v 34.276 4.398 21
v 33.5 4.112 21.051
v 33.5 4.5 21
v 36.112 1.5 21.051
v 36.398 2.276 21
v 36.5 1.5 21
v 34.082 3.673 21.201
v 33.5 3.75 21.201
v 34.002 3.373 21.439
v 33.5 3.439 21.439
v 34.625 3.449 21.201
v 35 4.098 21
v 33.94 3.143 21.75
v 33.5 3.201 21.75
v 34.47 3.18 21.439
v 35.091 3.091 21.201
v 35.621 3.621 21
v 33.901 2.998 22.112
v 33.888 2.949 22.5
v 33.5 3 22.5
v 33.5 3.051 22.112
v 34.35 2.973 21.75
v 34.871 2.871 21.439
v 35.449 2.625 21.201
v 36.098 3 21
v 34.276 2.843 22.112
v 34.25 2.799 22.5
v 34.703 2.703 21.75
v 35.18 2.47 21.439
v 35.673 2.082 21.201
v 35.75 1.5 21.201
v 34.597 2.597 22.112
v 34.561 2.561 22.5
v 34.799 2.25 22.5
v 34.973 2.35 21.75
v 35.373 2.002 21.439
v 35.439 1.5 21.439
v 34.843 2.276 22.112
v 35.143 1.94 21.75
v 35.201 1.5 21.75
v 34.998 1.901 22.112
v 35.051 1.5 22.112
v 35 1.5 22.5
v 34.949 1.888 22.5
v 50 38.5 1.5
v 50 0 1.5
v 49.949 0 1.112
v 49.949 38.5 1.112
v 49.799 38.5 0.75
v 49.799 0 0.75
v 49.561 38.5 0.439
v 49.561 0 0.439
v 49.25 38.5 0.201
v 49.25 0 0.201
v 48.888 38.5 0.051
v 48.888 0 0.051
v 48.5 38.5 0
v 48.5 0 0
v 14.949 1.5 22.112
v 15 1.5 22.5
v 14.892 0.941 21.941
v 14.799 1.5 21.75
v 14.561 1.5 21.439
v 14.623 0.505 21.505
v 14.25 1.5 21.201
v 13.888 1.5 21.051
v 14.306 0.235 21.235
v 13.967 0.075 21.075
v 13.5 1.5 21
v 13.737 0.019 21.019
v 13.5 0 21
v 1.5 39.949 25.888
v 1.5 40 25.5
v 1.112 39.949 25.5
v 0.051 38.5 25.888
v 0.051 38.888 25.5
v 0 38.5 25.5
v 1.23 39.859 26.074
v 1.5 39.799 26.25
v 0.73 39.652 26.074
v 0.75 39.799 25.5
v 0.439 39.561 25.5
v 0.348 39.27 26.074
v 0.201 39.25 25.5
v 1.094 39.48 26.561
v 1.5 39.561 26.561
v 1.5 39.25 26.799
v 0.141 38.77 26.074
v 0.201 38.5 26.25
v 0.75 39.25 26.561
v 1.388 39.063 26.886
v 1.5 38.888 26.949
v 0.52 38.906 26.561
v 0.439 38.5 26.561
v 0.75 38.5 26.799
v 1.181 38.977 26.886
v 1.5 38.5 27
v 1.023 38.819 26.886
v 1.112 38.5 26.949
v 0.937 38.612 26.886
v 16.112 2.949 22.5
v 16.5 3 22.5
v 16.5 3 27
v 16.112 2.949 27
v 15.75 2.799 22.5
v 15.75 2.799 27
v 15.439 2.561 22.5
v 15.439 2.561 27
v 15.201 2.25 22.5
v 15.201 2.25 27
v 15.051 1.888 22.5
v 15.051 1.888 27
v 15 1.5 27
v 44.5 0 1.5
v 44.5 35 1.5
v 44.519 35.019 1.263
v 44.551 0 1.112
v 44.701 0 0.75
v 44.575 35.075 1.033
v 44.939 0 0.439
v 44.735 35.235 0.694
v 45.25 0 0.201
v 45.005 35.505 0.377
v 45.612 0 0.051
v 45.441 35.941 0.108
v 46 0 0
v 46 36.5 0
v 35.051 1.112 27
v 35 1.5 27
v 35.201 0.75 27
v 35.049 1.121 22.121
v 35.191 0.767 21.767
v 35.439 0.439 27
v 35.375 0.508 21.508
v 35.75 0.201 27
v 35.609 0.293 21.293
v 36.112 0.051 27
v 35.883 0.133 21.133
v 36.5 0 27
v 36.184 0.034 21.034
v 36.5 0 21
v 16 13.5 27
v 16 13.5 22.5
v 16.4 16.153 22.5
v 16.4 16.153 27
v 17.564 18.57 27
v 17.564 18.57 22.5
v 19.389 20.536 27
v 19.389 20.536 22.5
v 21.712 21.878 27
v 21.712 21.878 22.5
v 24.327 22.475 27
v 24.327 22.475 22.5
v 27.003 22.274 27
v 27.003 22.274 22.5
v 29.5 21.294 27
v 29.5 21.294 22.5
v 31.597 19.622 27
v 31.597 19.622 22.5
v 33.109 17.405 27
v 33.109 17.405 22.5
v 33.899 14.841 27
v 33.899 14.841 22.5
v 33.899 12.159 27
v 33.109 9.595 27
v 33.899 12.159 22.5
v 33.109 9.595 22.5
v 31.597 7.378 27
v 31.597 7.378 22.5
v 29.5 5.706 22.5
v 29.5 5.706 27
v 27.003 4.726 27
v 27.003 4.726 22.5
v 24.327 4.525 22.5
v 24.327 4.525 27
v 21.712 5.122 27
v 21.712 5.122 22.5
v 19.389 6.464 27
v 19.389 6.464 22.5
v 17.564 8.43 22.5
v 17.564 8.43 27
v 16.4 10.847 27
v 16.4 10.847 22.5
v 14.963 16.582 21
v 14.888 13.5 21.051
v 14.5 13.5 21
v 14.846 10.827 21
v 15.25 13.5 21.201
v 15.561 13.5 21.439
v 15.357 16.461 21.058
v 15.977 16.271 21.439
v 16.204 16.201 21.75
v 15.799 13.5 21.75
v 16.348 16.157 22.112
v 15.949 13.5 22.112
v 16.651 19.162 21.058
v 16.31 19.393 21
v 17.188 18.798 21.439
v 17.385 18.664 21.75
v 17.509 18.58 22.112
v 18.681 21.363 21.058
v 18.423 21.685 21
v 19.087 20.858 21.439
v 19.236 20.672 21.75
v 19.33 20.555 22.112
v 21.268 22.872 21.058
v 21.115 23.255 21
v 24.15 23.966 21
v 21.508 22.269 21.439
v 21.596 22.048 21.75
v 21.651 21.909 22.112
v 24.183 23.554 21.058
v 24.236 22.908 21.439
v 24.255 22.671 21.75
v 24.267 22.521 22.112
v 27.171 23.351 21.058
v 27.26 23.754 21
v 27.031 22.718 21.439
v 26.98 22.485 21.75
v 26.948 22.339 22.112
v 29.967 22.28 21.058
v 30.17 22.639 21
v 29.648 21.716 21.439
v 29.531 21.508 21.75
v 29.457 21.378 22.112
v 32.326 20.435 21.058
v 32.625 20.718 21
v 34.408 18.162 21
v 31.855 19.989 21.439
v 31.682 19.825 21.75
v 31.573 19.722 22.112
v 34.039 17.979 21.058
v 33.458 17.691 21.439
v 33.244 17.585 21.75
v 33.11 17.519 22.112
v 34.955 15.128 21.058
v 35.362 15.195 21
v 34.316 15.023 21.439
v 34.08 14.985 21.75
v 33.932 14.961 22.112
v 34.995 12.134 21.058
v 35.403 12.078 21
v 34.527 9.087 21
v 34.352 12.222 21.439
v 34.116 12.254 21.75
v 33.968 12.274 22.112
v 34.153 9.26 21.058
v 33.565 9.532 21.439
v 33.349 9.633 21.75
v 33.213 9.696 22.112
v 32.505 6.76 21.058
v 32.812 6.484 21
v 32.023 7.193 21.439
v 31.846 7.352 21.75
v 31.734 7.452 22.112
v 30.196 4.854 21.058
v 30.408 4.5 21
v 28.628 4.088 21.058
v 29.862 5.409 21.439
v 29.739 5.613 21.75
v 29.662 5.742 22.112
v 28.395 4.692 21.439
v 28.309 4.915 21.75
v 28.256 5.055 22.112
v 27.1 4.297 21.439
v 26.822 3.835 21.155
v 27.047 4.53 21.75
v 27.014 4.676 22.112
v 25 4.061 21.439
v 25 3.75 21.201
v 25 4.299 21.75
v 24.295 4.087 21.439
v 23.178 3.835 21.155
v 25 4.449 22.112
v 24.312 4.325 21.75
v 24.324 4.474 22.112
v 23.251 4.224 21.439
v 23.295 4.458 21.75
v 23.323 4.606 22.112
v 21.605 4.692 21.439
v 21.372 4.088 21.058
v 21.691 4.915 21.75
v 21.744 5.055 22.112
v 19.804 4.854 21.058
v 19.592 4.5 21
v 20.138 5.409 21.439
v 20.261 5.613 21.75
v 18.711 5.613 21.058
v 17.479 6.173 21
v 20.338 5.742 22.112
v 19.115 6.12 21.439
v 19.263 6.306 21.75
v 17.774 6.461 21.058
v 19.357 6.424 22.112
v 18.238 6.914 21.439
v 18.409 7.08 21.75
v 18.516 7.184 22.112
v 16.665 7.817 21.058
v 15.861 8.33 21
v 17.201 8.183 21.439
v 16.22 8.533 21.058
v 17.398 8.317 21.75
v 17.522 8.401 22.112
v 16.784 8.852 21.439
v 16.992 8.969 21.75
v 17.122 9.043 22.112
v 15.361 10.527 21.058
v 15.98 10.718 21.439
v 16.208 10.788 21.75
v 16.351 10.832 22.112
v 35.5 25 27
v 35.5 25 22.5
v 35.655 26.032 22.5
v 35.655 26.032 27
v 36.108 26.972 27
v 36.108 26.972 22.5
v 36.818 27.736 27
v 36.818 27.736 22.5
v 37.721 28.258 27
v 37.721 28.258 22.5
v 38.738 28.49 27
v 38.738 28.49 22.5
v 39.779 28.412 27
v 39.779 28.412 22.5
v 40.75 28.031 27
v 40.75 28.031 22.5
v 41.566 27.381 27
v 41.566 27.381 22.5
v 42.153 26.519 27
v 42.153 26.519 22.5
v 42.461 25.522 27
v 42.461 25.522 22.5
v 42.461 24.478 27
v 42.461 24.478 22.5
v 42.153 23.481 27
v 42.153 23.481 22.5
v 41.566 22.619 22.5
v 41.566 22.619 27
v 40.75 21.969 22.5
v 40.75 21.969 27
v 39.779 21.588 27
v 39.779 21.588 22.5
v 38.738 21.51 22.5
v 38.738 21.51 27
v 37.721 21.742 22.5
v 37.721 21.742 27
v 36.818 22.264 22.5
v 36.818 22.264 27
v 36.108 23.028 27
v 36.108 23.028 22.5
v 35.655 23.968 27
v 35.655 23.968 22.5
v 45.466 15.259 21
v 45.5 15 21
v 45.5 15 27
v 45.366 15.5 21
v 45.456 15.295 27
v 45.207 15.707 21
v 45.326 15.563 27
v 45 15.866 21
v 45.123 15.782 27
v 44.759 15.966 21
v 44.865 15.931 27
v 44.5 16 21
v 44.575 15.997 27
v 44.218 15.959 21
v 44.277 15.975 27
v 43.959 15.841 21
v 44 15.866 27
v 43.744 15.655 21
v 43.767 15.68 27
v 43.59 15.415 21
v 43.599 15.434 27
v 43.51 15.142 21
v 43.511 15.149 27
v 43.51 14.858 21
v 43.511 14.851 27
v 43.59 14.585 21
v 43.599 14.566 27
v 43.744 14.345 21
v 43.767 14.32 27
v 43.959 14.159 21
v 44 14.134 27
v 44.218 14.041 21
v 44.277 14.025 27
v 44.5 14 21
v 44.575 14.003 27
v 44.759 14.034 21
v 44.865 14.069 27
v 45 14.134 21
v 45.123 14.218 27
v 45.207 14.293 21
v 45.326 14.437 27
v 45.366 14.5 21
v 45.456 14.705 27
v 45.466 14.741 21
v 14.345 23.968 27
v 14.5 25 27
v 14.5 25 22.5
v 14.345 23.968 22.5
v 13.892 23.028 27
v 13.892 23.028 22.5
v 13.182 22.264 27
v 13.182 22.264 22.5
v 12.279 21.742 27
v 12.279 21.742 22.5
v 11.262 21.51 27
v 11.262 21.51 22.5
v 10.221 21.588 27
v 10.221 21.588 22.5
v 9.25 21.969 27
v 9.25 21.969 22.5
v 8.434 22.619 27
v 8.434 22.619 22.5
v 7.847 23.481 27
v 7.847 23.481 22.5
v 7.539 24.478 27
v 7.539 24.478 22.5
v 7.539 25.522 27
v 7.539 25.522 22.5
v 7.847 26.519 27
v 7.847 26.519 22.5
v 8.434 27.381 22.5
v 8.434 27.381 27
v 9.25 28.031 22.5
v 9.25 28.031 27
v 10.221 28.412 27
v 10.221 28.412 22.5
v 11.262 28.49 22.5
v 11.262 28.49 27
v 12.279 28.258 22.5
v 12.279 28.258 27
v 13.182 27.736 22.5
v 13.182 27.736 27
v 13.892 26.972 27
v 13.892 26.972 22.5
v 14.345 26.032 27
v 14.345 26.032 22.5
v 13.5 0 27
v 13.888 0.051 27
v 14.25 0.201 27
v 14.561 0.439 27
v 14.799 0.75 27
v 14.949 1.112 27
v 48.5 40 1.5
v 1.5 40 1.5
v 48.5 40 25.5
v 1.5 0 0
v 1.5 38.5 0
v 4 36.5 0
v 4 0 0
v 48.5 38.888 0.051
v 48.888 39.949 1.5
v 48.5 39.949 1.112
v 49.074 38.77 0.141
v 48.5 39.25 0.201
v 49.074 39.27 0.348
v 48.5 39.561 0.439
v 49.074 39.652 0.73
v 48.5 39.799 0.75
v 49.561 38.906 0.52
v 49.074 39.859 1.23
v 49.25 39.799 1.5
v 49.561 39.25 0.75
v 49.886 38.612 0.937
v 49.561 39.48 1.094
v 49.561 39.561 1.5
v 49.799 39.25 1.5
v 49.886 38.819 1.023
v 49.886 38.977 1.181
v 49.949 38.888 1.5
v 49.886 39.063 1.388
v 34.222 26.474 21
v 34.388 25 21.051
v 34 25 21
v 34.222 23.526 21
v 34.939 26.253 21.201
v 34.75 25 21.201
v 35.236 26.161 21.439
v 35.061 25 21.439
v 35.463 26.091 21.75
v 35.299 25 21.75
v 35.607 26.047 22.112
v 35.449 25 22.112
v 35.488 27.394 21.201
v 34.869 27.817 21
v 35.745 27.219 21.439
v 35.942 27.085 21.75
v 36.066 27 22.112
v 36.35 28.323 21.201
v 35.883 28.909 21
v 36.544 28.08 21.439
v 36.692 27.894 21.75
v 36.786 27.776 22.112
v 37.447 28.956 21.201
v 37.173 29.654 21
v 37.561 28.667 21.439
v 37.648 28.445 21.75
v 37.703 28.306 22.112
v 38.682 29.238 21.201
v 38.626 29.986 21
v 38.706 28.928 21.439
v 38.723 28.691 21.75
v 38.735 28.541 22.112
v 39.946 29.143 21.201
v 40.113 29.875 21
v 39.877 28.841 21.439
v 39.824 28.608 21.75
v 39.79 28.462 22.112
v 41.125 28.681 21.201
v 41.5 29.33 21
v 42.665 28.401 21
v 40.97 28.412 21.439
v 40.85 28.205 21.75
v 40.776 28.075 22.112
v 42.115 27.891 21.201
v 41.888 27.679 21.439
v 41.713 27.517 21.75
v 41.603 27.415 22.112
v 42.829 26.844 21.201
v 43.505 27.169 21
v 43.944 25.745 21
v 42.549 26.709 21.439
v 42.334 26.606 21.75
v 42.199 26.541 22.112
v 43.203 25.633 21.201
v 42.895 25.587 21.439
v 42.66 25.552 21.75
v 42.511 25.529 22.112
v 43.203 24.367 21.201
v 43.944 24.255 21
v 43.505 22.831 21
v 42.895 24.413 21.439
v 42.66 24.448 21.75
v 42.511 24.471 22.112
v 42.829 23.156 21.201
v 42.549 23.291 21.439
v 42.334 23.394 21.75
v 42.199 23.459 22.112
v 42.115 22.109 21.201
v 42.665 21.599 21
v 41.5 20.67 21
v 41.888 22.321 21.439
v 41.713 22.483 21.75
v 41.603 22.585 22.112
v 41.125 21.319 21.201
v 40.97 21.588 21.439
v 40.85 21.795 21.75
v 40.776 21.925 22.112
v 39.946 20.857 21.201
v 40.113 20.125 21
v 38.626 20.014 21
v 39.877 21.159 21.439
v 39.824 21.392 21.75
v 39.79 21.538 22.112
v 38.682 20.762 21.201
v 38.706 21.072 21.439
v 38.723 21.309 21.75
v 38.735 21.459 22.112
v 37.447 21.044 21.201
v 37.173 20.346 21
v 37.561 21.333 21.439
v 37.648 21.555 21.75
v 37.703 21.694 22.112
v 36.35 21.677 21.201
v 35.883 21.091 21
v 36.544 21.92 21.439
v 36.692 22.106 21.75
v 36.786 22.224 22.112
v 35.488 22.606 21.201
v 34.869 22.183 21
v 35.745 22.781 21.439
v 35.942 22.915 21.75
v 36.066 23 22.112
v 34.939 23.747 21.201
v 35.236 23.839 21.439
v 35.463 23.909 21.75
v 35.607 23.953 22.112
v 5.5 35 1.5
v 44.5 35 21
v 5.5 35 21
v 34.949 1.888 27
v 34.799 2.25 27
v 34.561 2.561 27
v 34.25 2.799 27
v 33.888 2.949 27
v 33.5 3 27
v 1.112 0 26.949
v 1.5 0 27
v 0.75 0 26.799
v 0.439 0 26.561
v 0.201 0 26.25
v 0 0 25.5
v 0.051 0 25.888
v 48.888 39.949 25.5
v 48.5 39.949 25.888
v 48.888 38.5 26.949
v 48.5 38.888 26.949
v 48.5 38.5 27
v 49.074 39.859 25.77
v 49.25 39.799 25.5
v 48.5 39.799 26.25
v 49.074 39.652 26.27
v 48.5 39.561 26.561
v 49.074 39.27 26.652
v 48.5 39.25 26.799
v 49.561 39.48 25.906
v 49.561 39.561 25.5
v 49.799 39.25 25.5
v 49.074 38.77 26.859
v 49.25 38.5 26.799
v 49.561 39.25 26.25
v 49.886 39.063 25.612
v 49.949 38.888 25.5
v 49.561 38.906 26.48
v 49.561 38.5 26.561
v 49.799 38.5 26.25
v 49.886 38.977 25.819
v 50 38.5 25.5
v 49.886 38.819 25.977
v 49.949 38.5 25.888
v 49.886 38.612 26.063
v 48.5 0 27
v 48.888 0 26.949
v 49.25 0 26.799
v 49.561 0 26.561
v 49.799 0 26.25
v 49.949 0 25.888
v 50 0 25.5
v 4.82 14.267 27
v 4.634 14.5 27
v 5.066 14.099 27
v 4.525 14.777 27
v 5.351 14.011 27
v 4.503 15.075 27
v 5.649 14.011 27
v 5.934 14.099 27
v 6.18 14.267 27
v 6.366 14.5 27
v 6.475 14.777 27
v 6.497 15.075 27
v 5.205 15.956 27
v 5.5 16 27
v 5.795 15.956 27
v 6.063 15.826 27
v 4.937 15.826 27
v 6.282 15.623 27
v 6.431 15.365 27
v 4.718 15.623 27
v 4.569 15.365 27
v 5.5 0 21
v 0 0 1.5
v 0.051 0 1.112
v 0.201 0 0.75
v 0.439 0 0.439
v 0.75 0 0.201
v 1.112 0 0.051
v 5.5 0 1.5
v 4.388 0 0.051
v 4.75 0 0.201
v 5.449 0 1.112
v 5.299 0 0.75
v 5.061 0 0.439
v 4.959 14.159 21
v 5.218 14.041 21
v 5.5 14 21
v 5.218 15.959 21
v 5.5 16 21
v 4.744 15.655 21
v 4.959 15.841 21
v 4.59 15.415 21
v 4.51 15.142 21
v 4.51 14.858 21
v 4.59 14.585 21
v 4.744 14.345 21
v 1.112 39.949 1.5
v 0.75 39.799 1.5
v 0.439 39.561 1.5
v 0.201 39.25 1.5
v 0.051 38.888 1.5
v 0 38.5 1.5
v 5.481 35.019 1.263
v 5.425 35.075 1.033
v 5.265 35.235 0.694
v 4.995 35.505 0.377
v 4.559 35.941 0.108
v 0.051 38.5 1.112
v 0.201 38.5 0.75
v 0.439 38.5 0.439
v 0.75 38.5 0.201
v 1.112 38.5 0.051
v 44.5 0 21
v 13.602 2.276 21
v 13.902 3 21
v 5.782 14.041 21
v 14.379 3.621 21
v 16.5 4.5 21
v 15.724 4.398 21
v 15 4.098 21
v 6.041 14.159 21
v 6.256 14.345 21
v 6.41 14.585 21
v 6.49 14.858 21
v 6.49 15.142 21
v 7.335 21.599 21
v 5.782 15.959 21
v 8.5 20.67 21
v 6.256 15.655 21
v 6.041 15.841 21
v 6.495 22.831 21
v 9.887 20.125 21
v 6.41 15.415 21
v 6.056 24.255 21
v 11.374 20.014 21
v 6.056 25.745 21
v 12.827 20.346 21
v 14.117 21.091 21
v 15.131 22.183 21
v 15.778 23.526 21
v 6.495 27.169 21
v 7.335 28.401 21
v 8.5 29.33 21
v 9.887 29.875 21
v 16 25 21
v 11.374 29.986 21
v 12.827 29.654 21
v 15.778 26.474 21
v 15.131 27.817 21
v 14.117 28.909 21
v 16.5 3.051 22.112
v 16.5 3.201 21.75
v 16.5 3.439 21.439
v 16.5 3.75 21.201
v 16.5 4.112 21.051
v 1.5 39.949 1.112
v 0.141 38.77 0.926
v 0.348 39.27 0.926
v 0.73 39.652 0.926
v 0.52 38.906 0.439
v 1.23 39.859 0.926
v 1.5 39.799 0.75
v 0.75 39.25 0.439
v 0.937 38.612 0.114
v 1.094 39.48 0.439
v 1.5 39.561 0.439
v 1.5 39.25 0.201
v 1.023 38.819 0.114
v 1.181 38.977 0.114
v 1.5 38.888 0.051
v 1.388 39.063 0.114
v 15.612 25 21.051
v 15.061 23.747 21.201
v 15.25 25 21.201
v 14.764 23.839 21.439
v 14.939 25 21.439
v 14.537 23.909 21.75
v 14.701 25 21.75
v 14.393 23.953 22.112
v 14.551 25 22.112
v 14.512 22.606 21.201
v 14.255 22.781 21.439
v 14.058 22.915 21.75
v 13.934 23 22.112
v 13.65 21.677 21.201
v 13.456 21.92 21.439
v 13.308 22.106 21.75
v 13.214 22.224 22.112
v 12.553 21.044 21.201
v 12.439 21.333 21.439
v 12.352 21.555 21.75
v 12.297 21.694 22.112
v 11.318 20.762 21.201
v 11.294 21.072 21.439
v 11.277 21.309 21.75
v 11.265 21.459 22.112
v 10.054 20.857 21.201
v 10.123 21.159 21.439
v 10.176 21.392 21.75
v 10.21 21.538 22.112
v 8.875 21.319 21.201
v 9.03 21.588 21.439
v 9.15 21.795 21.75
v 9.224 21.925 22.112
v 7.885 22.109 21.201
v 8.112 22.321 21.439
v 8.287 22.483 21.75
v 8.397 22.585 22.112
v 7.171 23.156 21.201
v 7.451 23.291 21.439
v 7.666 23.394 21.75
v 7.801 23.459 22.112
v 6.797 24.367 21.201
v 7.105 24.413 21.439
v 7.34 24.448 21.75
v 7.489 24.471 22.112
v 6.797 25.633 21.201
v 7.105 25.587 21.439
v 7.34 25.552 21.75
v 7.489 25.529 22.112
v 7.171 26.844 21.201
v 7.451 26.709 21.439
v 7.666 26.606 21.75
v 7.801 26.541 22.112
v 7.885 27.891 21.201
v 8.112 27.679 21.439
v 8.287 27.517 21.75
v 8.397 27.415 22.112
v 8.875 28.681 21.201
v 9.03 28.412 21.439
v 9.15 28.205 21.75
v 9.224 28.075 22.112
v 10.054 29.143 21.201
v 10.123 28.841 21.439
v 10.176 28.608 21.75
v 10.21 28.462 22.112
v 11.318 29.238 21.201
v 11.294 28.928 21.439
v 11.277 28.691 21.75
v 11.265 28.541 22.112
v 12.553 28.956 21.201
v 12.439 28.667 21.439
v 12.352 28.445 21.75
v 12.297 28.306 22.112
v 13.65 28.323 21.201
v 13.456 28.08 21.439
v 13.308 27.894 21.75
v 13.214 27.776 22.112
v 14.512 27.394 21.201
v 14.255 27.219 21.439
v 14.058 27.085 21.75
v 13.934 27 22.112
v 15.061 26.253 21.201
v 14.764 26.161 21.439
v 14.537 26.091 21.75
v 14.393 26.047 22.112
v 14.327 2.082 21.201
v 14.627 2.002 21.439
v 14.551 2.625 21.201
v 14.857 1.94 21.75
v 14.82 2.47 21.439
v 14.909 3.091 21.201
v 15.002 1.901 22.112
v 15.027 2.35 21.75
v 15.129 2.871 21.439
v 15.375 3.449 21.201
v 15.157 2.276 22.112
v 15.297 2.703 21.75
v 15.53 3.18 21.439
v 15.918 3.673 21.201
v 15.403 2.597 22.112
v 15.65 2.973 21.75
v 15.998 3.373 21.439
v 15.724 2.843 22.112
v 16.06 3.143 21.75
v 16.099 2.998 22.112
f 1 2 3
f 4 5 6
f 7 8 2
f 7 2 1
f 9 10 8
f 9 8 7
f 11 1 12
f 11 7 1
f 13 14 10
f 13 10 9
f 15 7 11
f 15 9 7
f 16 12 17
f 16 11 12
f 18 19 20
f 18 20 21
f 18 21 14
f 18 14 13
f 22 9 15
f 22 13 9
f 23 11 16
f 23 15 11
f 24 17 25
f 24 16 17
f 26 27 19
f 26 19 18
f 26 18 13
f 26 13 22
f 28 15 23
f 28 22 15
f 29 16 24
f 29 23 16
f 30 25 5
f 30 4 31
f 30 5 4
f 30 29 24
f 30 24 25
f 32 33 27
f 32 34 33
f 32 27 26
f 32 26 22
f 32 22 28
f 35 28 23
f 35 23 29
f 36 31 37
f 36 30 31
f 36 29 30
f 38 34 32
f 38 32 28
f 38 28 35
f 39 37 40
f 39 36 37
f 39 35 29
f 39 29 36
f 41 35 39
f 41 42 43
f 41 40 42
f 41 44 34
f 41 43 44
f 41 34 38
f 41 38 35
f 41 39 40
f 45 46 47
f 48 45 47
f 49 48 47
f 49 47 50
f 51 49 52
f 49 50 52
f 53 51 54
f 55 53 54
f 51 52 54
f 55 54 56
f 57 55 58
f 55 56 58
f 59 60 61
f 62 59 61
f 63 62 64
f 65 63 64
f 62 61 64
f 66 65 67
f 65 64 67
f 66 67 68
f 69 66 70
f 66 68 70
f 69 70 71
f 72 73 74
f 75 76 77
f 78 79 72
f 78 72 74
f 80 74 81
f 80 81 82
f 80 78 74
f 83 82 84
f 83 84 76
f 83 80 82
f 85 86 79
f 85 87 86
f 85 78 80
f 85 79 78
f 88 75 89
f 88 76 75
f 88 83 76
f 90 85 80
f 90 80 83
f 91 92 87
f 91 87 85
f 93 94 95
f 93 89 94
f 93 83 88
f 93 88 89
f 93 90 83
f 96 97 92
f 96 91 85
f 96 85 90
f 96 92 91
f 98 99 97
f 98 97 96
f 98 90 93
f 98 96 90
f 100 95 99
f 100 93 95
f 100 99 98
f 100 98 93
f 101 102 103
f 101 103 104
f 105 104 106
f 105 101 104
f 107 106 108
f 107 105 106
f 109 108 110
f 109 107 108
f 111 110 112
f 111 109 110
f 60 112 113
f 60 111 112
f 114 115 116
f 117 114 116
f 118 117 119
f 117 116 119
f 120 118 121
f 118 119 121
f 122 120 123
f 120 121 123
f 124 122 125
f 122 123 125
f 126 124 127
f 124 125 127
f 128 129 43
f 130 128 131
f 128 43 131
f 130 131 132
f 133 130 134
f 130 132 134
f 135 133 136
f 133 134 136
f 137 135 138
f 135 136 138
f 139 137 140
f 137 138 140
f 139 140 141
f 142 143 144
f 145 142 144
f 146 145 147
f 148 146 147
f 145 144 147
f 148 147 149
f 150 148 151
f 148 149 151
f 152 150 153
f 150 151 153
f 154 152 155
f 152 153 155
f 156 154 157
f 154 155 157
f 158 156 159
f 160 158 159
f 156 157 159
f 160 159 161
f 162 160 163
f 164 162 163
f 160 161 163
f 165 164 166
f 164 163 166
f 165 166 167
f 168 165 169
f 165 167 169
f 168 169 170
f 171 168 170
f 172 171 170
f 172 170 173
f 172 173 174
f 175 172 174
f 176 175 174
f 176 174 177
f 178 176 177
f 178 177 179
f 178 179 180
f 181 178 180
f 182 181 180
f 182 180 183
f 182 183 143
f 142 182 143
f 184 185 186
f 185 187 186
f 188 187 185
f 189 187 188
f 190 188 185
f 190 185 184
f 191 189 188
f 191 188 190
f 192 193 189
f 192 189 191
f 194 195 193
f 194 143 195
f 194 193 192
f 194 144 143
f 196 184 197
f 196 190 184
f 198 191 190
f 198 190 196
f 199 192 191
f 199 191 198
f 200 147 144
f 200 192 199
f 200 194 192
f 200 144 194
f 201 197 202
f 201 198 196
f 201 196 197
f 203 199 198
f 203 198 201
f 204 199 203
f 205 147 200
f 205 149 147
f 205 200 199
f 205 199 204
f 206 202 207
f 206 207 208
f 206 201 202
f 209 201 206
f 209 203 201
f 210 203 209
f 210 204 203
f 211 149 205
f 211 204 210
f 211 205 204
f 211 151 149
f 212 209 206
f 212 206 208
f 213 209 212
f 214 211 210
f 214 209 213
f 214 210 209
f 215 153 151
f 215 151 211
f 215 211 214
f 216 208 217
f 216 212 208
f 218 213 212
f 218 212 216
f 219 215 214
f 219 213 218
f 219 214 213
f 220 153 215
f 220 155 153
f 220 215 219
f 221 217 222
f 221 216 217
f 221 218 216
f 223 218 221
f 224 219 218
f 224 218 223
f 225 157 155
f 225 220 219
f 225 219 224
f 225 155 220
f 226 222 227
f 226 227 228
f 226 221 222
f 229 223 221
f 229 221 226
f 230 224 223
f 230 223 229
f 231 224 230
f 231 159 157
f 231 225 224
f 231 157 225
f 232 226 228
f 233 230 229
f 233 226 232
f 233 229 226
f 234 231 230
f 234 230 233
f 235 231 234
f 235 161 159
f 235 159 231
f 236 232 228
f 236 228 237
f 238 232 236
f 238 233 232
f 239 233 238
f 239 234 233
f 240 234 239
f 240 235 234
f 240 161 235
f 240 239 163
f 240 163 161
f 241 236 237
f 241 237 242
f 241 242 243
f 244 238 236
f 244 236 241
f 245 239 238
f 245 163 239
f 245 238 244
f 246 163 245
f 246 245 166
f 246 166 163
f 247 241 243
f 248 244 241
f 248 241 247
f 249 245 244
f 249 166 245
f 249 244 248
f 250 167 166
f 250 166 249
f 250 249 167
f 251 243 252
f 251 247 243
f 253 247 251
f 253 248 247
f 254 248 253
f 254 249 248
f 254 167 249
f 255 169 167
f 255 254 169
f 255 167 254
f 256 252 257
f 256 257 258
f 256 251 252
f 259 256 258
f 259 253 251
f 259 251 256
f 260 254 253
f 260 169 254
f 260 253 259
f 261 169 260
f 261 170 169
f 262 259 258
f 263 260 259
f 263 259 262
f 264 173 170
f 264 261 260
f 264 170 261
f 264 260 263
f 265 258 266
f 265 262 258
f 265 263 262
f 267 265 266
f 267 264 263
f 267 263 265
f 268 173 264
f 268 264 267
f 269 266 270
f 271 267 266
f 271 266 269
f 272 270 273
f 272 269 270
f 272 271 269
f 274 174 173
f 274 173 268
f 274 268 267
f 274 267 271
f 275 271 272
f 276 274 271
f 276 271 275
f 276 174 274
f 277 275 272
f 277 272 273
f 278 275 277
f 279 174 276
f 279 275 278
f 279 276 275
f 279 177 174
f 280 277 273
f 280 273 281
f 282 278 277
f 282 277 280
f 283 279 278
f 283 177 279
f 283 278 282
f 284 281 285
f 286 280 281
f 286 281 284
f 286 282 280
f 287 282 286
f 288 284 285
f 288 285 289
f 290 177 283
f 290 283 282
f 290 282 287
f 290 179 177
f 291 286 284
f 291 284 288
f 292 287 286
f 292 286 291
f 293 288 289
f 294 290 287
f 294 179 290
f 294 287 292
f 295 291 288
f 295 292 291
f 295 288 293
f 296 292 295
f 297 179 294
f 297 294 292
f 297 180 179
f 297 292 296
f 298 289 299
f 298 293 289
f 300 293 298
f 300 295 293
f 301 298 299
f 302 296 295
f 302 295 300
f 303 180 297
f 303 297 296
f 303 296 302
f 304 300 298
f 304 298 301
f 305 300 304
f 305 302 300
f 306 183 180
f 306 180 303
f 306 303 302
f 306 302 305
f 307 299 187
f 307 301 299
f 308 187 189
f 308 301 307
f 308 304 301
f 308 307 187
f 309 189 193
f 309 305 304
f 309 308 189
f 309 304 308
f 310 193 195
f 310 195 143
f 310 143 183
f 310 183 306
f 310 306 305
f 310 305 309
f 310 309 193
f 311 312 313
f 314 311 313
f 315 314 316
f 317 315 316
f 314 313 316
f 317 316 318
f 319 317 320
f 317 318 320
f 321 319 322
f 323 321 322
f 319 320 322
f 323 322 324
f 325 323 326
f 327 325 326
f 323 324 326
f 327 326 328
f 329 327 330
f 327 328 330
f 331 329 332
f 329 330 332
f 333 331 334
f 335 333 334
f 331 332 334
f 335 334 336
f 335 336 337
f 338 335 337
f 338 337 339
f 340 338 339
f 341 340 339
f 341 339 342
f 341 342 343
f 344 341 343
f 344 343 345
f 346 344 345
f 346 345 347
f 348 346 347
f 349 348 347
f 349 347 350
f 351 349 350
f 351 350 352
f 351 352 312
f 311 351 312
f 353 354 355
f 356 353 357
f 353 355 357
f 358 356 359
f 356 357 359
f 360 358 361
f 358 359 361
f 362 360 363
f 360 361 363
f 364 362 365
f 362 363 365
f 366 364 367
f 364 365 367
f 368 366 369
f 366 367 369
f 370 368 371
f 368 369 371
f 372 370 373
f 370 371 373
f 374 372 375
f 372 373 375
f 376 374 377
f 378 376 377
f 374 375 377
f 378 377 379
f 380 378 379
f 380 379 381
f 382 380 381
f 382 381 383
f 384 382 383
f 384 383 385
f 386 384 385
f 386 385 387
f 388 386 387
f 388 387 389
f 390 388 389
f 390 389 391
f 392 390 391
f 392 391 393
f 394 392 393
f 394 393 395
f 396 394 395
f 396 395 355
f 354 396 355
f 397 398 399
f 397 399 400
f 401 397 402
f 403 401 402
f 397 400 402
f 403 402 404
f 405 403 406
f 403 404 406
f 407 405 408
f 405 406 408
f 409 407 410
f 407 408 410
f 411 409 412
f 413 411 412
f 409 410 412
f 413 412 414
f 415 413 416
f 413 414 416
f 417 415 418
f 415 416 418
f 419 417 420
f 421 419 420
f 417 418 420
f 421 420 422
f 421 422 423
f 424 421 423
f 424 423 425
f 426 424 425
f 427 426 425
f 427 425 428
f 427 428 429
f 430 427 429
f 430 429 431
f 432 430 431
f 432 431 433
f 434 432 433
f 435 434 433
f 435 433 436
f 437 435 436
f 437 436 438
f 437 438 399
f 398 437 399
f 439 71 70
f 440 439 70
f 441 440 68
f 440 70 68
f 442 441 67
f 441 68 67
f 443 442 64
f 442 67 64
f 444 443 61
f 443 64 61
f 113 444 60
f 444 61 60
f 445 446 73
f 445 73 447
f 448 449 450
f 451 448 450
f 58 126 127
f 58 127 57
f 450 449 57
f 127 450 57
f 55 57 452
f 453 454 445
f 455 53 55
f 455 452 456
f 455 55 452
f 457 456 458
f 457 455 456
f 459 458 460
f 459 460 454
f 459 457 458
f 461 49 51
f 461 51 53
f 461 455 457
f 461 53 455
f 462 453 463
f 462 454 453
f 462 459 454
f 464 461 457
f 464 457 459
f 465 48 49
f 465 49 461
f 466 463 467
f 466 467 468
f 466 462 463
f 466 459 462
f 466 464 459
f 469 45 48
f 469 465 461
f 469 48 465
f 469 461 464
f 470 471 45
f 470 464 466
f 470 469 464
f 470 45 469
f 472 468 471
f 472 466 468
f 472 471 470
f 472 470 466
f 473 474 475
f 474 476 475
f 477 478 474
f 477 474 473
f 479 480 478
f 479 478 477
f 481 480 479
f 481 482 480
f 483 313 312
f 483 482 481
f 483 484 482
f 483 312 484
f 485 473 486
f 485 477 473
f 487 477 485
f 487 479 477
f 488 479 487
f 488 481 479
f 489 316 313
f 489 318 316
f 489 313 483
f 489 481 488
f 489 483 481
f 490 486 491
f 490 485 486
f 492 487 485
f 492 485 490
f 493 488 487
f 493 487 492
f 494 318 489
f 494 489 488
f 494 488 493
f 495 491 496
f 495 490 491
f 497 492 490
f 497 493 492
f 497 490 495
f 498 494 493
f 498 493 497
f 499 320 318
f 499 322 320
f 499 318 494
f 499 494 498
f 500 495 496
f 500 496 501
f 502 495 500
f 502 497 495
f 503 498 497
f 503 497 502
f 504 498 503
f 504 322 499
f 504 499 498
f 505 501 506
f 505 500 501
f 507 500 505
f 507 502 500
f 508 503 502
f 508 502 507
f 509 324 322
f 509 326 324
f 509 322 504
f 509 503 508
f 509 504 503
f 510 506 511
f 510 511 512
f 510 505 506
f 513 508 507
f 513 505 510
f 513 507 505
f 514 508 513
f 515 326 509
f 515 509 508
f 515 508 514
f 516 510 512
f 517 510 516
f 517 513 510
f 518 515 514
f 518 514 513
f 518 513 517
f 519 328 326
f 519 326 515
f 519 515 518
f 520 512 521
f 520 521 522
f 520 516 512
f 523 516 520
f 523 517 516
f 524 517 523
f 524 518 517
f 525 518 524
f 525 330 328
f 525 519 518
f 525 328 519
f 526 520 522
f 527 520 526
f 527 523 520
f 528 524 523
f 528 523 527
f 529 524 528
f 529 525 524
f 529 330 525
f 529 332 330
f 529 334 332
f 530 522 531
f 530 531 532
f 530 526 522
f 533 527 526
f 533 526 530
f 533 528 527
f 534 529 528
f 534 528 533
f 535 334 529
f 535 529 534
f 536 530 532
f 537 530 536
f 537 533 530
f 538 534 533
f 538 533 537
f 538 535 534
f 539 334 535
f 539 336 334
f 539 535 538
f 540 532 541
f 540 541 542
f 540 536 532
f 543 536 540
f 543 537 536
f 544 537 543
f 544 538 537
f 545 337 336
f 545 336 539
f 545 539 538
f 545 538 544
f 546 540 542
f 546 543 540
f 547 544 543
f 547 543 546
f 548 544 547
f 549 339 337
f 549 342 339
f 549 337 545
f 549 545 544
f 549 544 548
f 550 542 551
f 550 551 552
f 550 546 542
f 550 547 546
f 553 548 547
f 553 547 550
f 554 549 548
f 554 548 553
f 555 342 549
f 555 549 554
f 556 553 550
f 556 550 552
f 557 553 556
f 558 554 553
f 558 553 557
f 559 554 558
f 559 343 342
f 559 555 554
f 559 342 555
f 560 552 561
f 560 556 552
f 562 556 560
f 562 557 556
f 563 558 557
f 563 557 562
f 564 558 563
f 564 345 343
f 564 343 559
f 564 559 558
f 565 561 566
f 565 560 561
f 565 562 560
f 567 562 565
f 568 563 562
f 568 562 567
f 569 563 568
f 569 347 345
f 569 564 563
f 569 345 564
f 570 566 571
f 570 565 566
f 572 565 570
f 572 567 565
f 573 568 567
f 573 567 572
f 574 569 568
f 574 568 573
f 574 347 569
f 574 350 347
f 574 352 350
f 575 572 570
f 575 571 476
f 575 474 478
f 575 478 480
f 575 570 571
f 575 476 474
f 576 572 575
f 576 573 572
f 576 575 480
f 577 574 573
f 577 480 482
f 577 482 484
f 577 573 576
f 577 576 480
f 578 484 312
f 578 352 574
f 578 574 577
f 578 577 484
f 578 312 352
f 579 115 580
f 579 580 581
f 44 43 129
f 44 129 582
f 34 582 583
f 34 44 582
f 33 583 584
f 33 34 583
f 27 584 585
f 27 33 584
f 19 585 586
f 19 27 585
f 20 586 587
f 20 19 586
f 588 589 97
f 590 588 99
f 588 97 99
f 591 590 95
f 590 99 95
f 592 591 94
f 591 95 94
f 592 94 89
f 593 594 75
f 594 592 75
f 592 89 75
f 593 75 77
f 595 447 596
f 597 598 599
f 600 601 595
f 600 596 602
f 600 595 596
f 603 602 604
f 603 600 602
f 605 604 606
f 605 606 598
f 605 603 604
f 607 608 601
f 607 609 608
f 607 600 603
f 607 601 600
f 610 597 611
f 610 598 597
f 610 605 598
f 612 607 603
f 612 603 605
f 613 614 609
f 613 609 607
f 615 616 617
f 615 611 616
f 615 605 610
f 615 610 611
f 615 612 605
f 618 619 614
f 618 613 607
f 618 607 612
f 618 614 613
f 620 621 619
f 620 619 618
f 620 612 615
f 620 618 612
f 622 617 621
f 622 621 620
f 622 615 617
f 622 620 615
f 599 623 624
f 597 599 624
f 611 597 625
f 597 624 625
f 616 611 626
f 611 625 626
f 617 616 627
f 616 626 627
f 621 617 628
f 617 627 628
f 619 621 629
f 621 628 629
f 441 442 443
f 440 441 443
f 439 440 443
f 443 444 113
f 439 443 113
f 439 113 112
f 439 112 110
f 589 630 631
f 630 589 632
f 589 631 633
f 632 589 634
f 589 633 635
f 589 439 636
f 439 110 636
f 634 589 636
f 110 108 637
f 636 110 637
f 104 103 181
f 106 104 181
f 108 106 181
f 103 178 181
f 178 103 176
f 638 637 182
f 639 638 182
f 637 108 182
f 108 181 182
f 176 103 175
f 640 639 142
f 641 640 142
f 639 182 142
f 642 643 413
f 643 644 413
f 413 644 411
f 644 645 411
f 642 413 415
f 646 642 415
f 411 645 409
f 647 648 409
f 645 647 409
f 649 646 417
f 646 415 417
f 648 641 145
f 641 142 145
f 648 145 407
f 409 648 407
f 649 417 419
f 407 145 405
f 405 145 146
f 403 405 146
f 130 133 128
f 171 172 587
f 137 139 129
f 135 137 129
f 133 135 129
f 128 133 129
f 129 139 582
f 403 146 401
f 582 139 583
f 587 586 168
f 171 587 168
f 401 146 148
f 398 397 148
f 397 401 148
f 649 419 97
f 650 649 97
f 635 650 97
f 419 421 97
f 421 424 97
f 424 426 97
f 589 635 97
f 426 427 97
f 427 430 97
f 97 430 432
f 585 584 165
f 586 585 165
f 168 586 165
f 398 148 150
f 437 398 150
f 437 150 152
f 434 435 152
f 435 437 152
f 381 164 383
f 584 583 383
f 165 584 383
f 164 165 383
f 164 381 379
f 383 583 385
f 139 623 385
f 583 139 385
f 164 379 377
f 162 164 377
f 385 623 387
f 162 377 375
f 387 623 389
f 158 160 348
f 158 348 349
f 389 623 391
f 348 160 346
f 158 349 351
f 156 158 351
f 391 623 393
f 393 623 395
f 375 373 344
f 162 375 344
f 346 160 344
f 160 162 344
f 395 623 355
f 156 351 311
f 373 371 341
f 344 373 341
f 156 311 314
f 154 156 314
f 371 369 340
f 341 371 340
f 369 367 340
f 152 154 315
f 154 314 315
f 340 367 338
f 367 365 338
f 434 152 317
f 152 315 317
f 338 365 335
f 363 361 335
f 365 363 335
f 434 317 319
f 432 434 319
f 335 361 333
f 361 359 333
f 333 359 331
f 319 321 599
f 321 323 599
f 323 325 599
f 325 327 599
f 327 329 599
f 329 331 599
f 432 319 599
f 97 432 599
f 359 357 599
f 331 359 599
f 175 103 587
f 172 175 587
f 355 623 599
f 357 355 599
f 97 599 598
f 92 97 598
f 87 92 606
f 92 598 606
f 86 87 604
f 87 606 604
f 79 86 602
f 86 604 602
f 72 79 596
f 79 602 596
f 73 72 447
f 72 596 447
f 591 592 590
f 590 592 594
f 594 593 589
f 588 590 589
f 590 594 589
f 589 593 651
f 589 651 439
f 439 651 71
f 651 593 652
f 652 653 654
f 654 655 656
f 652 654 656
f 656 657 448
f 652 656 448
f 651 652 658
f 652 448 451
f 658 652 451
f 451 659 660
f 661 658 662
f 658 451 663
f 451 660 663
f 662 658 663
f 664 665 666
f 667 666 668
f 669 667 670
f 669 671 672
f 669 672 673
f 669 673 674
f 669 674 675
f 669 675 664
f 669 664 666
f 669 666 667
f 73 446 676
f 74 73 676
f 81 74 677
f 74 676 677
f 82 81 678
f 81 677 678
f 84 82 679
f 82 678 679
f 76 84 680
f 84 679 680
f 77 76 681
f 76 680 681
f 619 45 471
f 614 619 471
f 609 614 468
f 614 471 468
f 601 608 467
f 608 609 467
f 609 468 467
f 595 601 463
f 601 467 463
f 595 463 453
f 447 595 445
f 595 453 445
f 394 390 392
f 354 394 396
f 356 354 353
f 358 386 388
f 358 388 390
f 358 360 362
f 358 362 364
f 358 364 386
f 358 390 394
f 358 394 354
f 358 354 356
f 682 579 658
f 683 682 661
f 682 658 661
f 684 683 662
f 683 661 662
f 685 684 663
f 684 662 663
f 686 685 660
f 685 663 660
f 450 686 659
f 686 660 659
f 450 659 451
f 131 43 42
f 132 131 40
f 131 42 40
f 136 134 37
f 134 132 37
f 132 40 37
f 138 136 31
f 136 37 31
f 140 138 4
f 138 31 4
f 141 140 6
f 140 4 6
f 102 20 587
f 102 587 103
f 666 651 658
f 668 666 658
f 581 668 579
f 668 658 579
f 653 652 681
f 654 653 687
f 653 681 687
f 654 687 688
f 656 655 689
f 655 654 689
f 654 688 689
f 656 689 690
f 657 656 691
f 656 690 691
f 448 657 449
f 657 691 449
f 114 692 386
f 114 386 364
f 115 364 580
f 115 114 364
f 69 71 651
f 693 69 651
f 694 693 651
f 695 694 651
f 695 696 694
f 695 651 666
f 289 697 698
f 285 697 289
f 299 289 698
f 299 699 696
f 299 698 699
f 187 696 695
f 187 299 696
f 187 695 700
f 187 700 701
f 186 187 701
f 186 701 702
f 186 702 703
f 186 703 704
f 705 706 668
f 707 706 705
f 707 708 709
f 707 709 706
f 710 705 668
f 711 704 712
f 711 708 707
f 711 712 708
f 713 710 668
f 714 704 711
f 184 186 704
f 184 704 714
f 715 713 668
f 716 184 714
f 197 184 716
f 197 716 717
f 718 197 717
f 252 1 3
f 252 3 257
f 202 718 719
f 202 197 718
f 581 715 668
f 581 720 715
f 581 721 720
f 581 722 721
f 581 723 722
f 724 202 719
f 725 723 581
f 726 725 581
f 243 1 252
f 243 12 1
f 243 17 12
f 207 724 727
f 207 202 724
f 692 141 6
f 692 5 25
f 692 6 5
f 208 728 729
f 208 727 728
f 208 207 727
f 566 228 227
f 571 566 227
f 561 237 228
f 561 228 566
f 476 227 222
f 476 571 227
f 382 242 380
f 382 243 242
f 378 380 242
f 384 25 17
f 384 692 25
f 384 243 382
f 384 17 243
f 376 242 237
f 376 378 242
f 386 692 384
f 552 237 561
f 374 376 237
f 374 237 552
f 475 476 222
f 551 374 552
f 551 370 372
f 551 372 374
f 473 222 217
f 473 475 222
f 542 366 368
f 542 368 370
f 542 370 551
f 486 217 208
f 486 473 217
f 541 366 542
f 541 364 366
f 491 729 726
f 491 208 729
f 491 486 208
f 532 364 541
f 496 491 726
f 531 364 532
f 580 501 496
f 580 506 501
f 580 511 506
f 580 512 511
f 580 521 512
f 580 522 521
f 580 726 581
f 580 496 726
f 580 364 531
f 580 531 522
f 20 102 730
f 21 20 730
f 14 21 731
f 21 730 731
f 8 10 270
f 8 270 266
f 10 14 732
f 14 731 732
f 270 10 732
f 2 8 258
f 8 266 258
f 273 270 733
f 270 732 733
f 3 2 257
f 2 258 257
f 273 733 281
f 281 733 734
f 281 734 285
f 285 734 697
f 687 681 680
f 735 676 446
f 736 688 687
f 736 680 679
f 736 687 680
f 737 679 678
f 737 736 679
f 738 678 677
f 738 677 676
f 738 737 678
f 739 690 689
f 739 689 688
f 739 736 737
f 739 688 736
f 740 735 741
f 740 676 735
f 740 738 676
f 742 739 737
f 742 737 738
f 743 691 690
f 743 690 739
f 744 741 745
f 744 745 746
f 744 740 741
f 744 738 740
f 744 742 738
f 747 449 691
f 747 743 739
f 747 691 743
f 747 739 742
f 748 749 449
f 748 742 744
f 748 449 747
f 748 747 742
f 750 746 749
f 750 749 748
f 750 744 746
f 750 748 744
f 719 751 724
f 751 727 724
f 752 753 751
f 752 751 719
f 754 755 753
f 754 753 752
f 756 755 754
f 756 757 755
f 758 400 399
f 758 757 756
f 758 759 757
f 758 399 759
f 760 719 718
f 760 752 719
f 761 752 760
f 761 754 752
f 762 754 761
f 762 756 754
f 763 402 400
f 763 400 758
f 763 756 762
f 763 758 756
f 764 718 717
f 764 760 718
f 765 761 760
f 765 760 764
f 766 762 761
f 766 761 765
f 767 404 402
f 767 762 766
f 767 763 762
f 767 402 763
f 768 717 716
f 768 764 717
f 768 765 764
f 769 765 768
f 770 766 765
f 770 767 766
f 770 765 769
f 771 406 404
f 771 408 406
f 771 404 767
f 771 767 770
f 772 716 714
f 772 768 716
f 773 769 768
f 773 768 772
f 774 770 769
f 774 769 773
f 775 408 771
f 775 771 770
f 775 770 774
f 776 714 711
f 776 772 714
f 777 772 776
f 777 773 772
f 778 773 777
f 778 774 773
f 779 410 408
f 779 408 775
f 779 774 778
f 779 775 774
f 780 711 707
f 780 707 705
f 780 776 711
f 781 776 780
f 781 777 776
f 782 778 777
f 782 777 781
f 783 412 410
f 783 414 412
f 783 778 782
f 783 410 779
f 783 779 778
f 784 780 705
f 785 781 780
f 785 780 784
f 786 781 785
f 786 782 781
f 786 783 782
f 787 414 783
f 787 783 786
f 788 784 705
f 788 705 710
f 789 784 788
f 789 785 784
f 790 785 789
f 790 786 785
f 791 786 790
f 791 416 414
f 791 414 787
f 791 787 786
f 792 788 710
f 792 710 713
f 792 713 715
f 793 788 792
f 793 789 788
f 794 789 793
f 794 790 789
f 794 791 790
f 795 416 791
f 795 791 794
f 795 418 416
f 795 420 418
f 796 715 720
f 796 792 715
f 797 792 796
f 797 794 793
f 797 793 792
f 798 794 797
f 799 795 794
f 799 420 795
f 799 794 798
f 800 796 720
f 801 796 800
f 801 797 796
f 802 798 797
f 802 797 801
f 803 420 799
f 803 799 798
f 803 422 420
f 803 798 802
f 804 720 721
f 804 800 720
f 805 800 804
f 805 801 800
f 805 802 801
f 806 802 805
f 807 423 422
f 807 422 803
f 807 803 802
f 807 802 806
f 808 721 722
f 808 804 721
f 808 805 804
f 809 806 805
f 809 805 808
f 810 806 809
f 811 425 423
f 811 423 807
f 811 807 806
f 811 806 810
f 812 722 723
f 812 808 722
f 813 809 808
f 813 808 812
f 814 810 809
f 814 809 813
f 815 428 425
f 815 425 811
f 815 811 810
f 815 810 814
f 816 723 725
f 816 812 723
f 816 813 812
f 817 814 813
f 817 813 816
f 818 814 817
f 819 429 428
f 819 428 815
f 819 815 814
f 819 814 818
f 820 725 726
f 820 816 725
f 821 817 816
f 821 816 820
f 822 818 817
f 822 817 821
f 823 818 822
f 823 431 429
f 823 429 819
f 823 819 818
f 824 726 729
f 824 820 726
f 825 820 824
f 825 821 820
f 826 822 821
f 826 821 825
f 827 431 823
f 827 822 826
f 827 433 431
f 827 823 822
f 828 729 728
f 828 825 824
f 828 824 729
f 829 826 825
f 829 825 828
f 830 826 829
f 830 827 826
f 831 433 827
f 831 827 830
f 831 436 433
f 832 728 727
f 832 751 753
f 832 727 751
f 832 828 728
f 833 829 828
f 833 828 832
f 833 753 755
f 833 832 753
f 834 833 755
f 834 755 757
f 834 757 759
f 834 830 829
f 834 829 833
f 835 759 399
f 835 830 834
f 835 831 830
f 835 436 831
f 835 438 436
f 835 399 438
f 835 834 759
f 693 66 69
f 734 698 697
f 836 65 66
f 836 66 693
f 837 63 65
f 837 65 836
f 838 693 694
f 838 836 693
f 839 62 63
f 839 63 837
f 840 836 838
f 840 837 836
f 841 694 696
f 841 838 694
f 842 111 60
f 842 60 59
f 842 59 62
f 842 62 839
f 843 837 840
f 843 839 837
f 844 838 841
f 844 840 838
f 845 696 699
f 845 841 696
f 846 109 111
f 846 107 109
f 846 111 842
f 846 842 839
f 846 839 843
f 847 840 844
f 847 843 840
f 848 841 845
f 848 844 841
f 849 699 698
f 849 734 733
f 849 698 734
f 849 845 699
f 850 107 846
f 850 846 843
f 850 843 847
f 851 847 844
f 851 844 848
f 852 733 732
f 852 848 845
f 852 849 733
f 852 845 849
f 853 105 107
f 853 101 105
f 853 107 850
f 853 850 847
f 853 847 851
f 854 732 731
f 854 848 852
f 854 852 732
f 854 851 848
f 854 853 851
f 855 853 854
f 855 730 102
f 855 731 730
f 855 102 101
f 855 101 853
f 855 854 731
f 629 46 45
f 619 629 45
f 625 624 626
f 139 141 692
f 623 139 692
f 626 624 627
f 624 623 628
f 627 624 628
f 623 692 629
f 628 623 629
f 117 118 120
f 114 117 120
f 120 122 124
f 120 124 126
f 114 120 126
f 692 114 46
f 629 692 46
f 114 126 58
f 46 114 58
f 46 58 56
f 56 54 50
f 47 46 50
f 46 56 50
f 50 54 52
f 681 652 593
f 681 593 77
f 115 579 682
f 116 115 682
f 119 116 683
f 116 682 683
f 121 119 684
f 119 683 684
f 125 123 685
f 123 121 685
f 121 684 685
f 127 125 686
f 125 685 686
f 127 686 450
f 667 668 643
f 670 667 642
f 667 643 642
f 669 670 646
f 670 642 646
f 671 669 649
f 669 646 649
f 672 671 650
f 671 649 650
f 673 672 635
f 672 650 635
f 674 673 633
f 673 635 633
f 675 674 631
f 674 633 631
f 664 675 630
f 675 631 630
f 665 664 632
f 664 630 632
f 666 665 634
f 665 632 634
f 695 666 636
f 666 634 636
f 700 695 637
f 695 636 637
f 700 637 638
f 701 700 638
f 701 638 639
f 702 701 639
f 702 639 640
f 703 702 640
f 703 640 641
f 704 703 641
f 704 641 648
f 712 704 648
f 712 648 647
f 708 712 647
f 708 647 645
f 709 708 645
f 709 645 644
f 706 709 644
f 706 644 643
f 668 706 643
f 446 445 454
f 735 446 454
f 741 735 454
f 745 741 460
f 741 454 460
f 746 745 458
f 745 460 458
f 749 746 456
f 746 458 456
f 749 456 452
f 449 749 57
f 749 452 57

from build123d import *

# Parameters (mm, degrees)
SKETCH1_W           = 50
SKETCH1_H           = 40
BOSS_EXTRUDE1_DEPTH = 27
SKETCH2_W           = 39
SKETCH2_H           = 35
CUT_EXTRUDE1_DEPTH  = 21
SKETCH3_R           = 9
SKETCH3_R_2         = 3.5
SKETCH3_W           = 20
SKETCH3_H           = 3
CUT_EXTRUDE2_DEPTH  = 68.386942355
SKETCH4_R           = 1
CUT_EXTRUDE3_DEPTH  = 6
FILLET1_R           = 1.5


with BuildPart() as part:
    # Sketch1 → Boss-Extrude1 (new body)
    with BuildSketch(Plane.XY):
        with Locations((25, 20)):
            Rectangle(SKETCH1_W, SKETCH1_H)
    extrude(amount=BOSS_EXTRUDE1_DEPTH)

    # Sketch2 → Cut-Extrude1 (cut)
    with BuildSketch(Plane(origin=(0, 0, 0), x_dir=(-1, 0, 0), z_dir=(0, 0, -1))):
        with Locations((-25, 17.5)):
            Rectangle(SKETCH2_W, SKETCH2_H)
    extrude(amount=-CUT_EXTRUDE1_DEPTH, mode=Mode.SUBTRACT)

    # Sketch3 → Cut-Extrude2 (cut, through all)
    with BuildSketch(Plane(origin=(0, 0, 21), x_dir=(-1, 0, 0), z_dir=(0, 0, -1))):
        with Locations((-25, 13.5)):
            Circle(SKETCH3_R)
        with Locations((-39, 25)):
            Circle(SKETCH3_R_2)
        with Locations(Location((-11, 25, 0), (0, 0, 180))):
            Circle(SKETCH3_R_2)
        with Locations((-25, 1.5)):
            Rectangle(SKETCH3_W, SKETCH3_H)
    extrude(amount=-CUT_EXTRUDE2_DEPTH, mode=Mode.SUBTRACT)

    # Sketch4 → Cut-Extrude3 (cut)
    with BuildSketch(Plane.XY.offset(27)):
        with Locations((44.5, 15)):
            Circle(SKETCH4_R)
        with Locations(Location((5.5, 15, 0), (0, 0, 90))):
            Circle(SKETCH4_R)
    extrude(amount=-CUT_EXTRUDE3_DEPTH, mode=Mode.SUBTRACT)

    # Fillet1
    # the kernel refuses this fillet: 1.5 mm, written as the material it adds along each edge
    with BuildSketch(Plane(origin=(15, 3, 21), x_dir=(0, -1, 0), z_dir=(0, 0, 1)), Plane(origin=(35, 3, 21), x_dir=(-1, 0, 0), z_dir=(0, 0, 1))) as fillet1_piece_1:
        with BuildLine():
            CenterArc((FILLET1_R, FILLET1_R), FILLET1_R, 180, 90)
            Line((0, FILLET1_R), (0, 0))
            Line((0, 0), (FILLET1_R, 0))
        make_face()
    extrude(amount=6)
    # the kernel refuses this fillet: 1.5 mm, written as the material it takes off along each edge
    with BuildSketch(Plane(origin=(48.5, 38.5, 1.5), x_dir=(0, 0, -1), z_dir=(1, 0, 0))) as fillet1_2_piece_1_section:
        Polygon((0, 0), (FILLET1_R, 0), (FILLET1_R, FILLET1_R), (0, FILLET1_R), align=None)
    fillet1_2_piece_1 = extrude(amount=FILLET1_R, mode=Mode.PRIVATE)
    fillet1_2_piece_1 = fillet1_2_piece_1 - Plane(origin=(48.5, 38.5, 1.5), x_dir=(0, -0.7071067811865475, 0.7071067811865475), z_dir=(1, 0, 0)) * Sphere(FILLET1_R, mode=Mode.PRIVATE)
    add(fillet1_2_piece_1, mode=Mode.SUBTRACT)
    with BuildSketch(Plane(origin=(1.5, 38.5, 1.5), x_dir=(-1, 0, 0), z_dir=(0, 0, -1))) as fillet1_2_piece_2_section:
        Polygon((0, 0), (FILLET1_R, 0), (FILLET1_R, FILLET1_R), (0, FILLET1_R), align=None)
    fillet1_2_piece_2 = extrude(amount=FILLET1_R, mode=Mode.PRIVATE)
    fillet1_2_piece_2 = fillet1_2_piece_2 - Plane(origin=(1.5, 38.5, 1.5), x_dir=(0.7071067811865475, -0.7071067811865475, 0), z_dir=(0, 0, -1)) * Sphere(FILLET1_R, mode=Mode.PRIVATE)
    add(fillet1_2_piece_2, mode=Mode.SUBTRACT)
    with BuildSketch(Plane(origin=(1.5, 38.5, 25.5), x_dir=(-1, 0, 0), z_dir=(0, 0, 1))) as fillet1_2_piece_3_section:
        Polygon((0, 0), (FILLET1_R, 0), (FILLET1_R, -FILLET1_R), (0, -FILLET1_R), align=None)
    fillet1_2_piece_3 = extrude(amount=FILLET1_R, mode=Mode.PRIVATE)
    fillet1_2_piece_3 = fillet1_2_piece_3 - Plane(origin=(1.5, 38.5, 25.5), x_dir=(0.7071067811865475, -0.7071067811865475, 0), z_dir=(0, 0, 1)) * Sphere(FILLET1_R, mode=Mode.PRIVATE)
    add(fillet1_2_piece_3, mode=Mode.SUBTRACT)
    with BuildSketch(Plane(origin=(48.5, 38.5, 25.5), x_dir=(0, 0, 1), z_dir=(1, 0, 0))) as fillet1_2_piece_4_section:
        Polygon((0, 0), (FILLET1_R, 0), (FILLET1_R, -FILLET1_R), (0, -FILLET1_R), align=None)
    fillet1_2_piece_4 = extrude(amount=FILLET1_R, mode=Mode.PRIVATE)
    fillet1_2_piece_4 = fillet1_2_piece_4 - Plane(origin=(48.5, 38.5, 25.5), x_dir=(0, -0.7071067811865475, -0.7071067811865475), z_dir=(1, 0, 0)) * Sphere(FILLET1_R, mode=Mode.PRIVATE)
    add(fillet1_2_piece_4, mode=Mode.SUBTRACT)
    with BuildSketch(Plane(origin=(15, 0, 17.25), x_dir=(-1, 0, 0), z_dir=(0, 0, 1))) as fillet1_2_piece_5:
        with BuildLine():
            CenterArc((FILLET1_R, -FILLET1_R), FILLET1_R, 90, 90)
            Line((0, -FILLET1_R), (0, 0))
            Line((0, 0), (FILLET1_R, 0))
        make_face()
    extrude(amount=13.5, mode=Mode.SUBTRACT)
    with BuildSketch(Plane(origin=(35, 0, 17.25), x_dir=(1, 0, 0), z_dir=(0, 0, 1))) as fillet1_2_piece_6:
        with BuildLine():
            CenterArc((FILLET1_R, FILLET1_R), FILLET1_R, 180, 90)
            Line((0, FILLET1_R), (0, 0))
            Line((0, 0), (FILLET1_R, 0))
        make_face()
    extrude(amount=13.5, mode=Mode.SUBTRACT)
    with BuildSketch(Plane(origin=(15, -3.75, 21), x_dir=(-1, 0, 0), z_dir=(0, 1, 0)), Plane(origin=(35, 1.5, 21), x_dir=(1, 0, 0), z_dir=(0, -1, 0))) as fillet1_2_piece_7:
        with BuildLine():
            CenterArc((FILLET1_R, FILLET1_R), FILLET1_R, 180, 90)
            Line((0, FILLET1_R), (0, 0))
            Line((0, 0), (FILLET1_R, 0))
        make_face()
    extrude(amount=5.25, mode=Mode.SUBTRACT)
    with BuildSketch(Plane(origin=(16.5, 3, 21), x_dir=(0, 1, 0), z_dir=(1, 0, 0))) as fillet1_2_piece_8:
        with BuildLine():
            CenterArc((FILLET1_R, FILLET1_R), FILLET1_R, 180, 90)
            Line((0, FILLET1_R), (0, 0))
            Line((0, 0), (FILLET1_R, 0))
        make_face()
    extrude(amount=17, mode=Mode.SUBTRACT)
    with BuildSketch(Plane(origin=(39, 25, 21), x_dir=(-1, 0, 0), z_dir=(0, -1, 0))) as fillet1_2_piece_9:
        with BuildLine():
            CenterArc((3.5 + FILLET1_R, -FILLET1_R), FILLET1_R, 90, 90)
            Line((3.5, -FILLET1_R), (3.5, 0))
            Line((3.5, 0), (3.5 + FILLET1_R, 0))
        make_face()
    revolve(axis=Axis((39, 25, 21), (0, 0, -1)), mode=Mode.SUBTRACT)
    with BuildSketch(Plane(origin=(11, 25, 21), x_dir=(1, 0, 0), z_dir=(0, 1, 0))) as fillet1_2_piece_10:
        with BuildLine():
            CenterArc((3.5 + FILLET1_R, -FILLET1_R), FILLET1_R, 90, 90)
            Line((3.5, -FILLET1_R), (3.5, 0))
            Line((3.5, 0), (3.5 + FILLET1_R, 0))
        make_face()
    revolve(axis=Axis((11, 25, 21), (0, 0, -1)), mode=Mode.SUBTRACT)
    with BuildSketch(Plane(origin=(25, 13.5, 21), x_dir=(-1, 0, 0), z_dir=(0, -1, 0))) as fillet1_2_piece_11:
        with BuildLine():
            CenterArc((9 + FILLET1_R, -FILLET1_R), FILLET1_R, 90, 90)
            Line((9, -FILLET1_R), (9, 0))
            Line((9, 0), (9 + FILLET1_R, 0))
        make_face()
    revolve(axis=Axis((25, 13.5, 21), (0, 0, -1)), mode=Mode.SUBTRACT)
    with BuildSketch(Plane(origin=(5.5, -3.75, 0), x_dir=(-1, 0, 0), z_dir=(0, 1, 0)), Plane(origin=(44.5, 35, 0), x_dir=(1, 0, 0), z_dir=(0, -1, 0))) as fillet1_2_piece_12:
        with BuildLine():
            CenterArc((FILLET1_R, FILLET1_R), FILLET1_R, 180, 90)
            Line((0, FILLET1_R), (0, 0))
            Line((0, 0), (FILLET1_R, 0))
        make_face()
    extrude(amount=38.75, mode=Mode.SUBTRACT)
    with BuildSketch(Plane(origin=(5.5, 35, 0), x_dir=(0, 1, 0), z_dir=(1, 0, 0))) as fillet1_2_piece_13:
        with BuildLine():
            CenterArc((FILLET1_R, FILLET1_R), FILLET1_R, 180, 90)
            Line((0, FILLET1_R), (0, 0))
            Line((0, 0), (FILLET1_R, 0))
        make_face()
    extrude(amount=39, mode=Mode.SUBTRACT)
    with BuildSketch(Plane(origin=(50, -3.75, 0), x_dir=(-1, 0, 0), z_dir=(0, 1, 0)), Plane(origin=(0, 38.5, 0), x_dir=(1, 0, 0), z_dir=(0, -1, 0))) as fillet1_2_piece_14:
        with BuildLine():
            CenterArc((FILLET1_R, FILLET1_R), FILLET1_R, 180, 90)
            Line((0, FILLET1_R), (0, 0))
            Line((0, 0), (FILLET1_R, 0))
        make_face()
    extrude(amount=42.25, mode=Mode.SUBTRACT)
    with BuildSketch(Plane(origin=(48.5, 40, 0), x_dir=(0, -1, 0), z_dir=(-1, 0, 0))) as fillet1_2_piece_15:
        with BuildLine():
            CenterArc((FILLET1_R, FILLET1_R), FILLET1_R, 180, 90)
            Line((0, FILLET1_R), (0, 0))
            Line((0, 0), (FILLET1_R, 0))
        make_face()
    extrude(amount=47, mode=Mode.SUBTRACT)
    with BuildSketch(Plane(origin=(0, 40, 1.5), x_dir=(0, -1, 0), z_dir=(0, 0, 1)), Plane(origin=(50, 40, 1.5), x_dir=(-1, 0, 0), z_dir=(0, 0, 1))) as fillet1_2_piece_16:
        with BuildLine():
            CenterArc((FILLET1_R, FILLET1_R), FILLET1_R, 180, 90)
            Line((0, FILLET1_R), (0, 0))
            Line((0, 0), (FILLET1_R, 0))
        make_face()
    extrude(amount=24, mode=Mode.SUBTRACT)
    with BuildSketch(Plane(origin=(0, 38.5, 27), x_dir=(1, 0, 0), z_dir=(0, -1, 0)), Plane(origin=(50, -3.75, 27), x_dir=(-1, 0, 0), z_dir=(0, 1, 0))) as fillet1_2_piece_17:
        with BuildLine():
            CenterArc((FILLET1_R, -FILLET1_R), FILLET1_R, 90, 90)
            Line((0, -FILLET1_R), (0, 0))
            Line((0, 0), (FILLET1_R, 0))
        make_face()
    extrude(amount=42.25, mode=Mode.SUBTRACT)
    with BuildSketch(Plane(origin=(48.5, 40, 27), x_dir=(0, -1, 0), z_dir=(-1, 0, 0))) as fillet1_2_piece_18:
        with BuildLine():
            CenterArc((FILLET1_R, -FILLET1_R), FILLET1_R, 90, 90)
            Line((0, -FILLET1_R), (0, 0))
            Line((0, 0), (FILLET1_R, 0))
        make_face()
    extrude(amount=47, mode=Mode.SUBTRACT)
    with BuildSketch(Plane(origin=(16.5, 1.5, 21), x_dir=(-1, 0, 0), z_dir=(0, -1, 0))) as fillet1_2_piece_19:
        with BuildLine():
            CenterArc((1.5 + FILLET1_R, -FILLET1_R), FILLET1_R, 90, 90)
            Line((1.5, -FILLET1_R), (1.5, 0))
            Line((1.5, 0), (1.5 + FILLET1_R, 0))
        make_face()
    revolve(axis=Axis((16.5, 1.5, 21), (0, 0, -1)), revolution_arc=90, mode=Mode.SUBTRACT)
    with BuildSketch(Plane(origin=(33.5, 1.5, 21), x_dir=(0, 1, 0), z_dir=(-1, 0, 0))) as fillet1_2_piece_20:
        with BuildLine():
            CenterArc((1.5 + FILLET1_R, -FILLET1_R), FILLET1_R, 90, 90)
            Line((1.5, -FILLET1_R), (1.5, 0))
            Line((1.5, 0), (1.5 + FILLET1_R, 0))
        make_face()
    revolve(axis=Axis((33.5, 1.5, 21), (0, 0, -1)), revolution_arc=90, mode=Mode.SUBTRACT)
    with BuildSketch(Plane(origin=(1.75, 35, 0), x_dir=(0, 1, 0), z_dir=(1, 0, 0))) as fillet1_2_piece_21a_section:
        with BuildLine():
            CenterArc((FILLET1_R, FILLET1_R), FILLET1_R, 180, 90)
            Line((0, FILLET1_R), (0, 0))
            Line((0, 0), (FILLET1_R, 0))
        make_face()
    fillet1_2_piece_21a = extrude(amount=42.75, mode=Mode.PRIVATE)
    fillet1_2_piece_21a = split(fillet1_2_piece_21a, bisect_by=Plane(origin=(5.5, 35.339592671, 0.339592671), z_dir=(-1, 0, 0)), keep=Keep.TOP, mode=Mode.PRIVATE)
    with BuildSketch(Plane(origin=(5.5, -3.75, 0), x_dir=(-1, 0, 0), z_dir=(0, 1, 0))) as fillet1_2_piece_21b_section:
        with BuildLine():
            CenterArc((FILLET1_R, FILLET1_R), FILLET1_R, 180, 90)
            Line((0, FILLET1_R), (0, 0))
            Line((0, 0), (FILLET1_R, 0))
        make_face()
    fillet1_2_piece_21b = extrude(amount=42.5, mode=Mode.PRIVATE)
    fillet1_2_piece_21b = split(fillet1_2_piece_21b, bisect_by=Plane(origin=(5.160407329, 35, 0.339592671), z_dir=(0, 1, 0)), keep=Keep.TOP, mode=Mode.PRIVATE)
    fillet1_2_piece_21 = fillet1_2_piece_21a & fillet1_2_piece_21b
    add(fillet1_2_piece_21, mode=Mode.SUBTRACT)
    with BuildSketch(Plane(origin=(44.5, 38.75, 0), x_dir=(1, 0, 0), z_dir=(0, -1, 0))) as fillet1_2_piece_22a_section:
        with BuildLine():
            CenterArc((FILLET1_R, FILLET1_R), FILLET1_R, 180, 90)
            Line((0, FILLET1_R), (0, 0))
            Line((0, 0), (FILLET1_R, 0))
        make_face()
    fillet1_2_piece_22a = extrude(amount=42.5, mode=Mode.PRIVATE)
    fillet1_2_piece_22a = split(fillet1_2_piece_22a, bisect_by=Plane(origin=(44.839592671, 35, 0.339592671), z_dir=(0, 1, 0)), keep=Keep.TOP, mode=Mode.PRIVATE)
    with BuildSketch(Plane(origin=(5.5, 35, 0), x_dir=(0, 1, 0), z_dir=(1, 0, 0))) as fillet1_2_piece_22b_section:
        with BuildLine():
            CenterArc((FILLET1_R, FILLET1_R), FILLET1_R, 180, 90)
            Line((0, FILLET1_R), (0, 0))
            Line((0, 0), (FILLET1_R, 0))
        make_face()
    fillet1_2_piece_22b = extrude(amount=42.75, mode=Mode.PRIVATE)
    fillet1_2_piece_22b = split(fillet1_2_piece_22b, bisect_by=Plane(origin=(44.5, 35.339592671, 0.339592671), z_dir=(1, 0, 0)), keep=Keep.TOP, mode=Mode.PRIVATE)
    fillet1_2_piece_22 = fillet1_2_piece_22a & fillet1_2_piece_22b
    add(fillet1_2_piece_22, mode=Mode.SUBTRACT)


solid = part.part
